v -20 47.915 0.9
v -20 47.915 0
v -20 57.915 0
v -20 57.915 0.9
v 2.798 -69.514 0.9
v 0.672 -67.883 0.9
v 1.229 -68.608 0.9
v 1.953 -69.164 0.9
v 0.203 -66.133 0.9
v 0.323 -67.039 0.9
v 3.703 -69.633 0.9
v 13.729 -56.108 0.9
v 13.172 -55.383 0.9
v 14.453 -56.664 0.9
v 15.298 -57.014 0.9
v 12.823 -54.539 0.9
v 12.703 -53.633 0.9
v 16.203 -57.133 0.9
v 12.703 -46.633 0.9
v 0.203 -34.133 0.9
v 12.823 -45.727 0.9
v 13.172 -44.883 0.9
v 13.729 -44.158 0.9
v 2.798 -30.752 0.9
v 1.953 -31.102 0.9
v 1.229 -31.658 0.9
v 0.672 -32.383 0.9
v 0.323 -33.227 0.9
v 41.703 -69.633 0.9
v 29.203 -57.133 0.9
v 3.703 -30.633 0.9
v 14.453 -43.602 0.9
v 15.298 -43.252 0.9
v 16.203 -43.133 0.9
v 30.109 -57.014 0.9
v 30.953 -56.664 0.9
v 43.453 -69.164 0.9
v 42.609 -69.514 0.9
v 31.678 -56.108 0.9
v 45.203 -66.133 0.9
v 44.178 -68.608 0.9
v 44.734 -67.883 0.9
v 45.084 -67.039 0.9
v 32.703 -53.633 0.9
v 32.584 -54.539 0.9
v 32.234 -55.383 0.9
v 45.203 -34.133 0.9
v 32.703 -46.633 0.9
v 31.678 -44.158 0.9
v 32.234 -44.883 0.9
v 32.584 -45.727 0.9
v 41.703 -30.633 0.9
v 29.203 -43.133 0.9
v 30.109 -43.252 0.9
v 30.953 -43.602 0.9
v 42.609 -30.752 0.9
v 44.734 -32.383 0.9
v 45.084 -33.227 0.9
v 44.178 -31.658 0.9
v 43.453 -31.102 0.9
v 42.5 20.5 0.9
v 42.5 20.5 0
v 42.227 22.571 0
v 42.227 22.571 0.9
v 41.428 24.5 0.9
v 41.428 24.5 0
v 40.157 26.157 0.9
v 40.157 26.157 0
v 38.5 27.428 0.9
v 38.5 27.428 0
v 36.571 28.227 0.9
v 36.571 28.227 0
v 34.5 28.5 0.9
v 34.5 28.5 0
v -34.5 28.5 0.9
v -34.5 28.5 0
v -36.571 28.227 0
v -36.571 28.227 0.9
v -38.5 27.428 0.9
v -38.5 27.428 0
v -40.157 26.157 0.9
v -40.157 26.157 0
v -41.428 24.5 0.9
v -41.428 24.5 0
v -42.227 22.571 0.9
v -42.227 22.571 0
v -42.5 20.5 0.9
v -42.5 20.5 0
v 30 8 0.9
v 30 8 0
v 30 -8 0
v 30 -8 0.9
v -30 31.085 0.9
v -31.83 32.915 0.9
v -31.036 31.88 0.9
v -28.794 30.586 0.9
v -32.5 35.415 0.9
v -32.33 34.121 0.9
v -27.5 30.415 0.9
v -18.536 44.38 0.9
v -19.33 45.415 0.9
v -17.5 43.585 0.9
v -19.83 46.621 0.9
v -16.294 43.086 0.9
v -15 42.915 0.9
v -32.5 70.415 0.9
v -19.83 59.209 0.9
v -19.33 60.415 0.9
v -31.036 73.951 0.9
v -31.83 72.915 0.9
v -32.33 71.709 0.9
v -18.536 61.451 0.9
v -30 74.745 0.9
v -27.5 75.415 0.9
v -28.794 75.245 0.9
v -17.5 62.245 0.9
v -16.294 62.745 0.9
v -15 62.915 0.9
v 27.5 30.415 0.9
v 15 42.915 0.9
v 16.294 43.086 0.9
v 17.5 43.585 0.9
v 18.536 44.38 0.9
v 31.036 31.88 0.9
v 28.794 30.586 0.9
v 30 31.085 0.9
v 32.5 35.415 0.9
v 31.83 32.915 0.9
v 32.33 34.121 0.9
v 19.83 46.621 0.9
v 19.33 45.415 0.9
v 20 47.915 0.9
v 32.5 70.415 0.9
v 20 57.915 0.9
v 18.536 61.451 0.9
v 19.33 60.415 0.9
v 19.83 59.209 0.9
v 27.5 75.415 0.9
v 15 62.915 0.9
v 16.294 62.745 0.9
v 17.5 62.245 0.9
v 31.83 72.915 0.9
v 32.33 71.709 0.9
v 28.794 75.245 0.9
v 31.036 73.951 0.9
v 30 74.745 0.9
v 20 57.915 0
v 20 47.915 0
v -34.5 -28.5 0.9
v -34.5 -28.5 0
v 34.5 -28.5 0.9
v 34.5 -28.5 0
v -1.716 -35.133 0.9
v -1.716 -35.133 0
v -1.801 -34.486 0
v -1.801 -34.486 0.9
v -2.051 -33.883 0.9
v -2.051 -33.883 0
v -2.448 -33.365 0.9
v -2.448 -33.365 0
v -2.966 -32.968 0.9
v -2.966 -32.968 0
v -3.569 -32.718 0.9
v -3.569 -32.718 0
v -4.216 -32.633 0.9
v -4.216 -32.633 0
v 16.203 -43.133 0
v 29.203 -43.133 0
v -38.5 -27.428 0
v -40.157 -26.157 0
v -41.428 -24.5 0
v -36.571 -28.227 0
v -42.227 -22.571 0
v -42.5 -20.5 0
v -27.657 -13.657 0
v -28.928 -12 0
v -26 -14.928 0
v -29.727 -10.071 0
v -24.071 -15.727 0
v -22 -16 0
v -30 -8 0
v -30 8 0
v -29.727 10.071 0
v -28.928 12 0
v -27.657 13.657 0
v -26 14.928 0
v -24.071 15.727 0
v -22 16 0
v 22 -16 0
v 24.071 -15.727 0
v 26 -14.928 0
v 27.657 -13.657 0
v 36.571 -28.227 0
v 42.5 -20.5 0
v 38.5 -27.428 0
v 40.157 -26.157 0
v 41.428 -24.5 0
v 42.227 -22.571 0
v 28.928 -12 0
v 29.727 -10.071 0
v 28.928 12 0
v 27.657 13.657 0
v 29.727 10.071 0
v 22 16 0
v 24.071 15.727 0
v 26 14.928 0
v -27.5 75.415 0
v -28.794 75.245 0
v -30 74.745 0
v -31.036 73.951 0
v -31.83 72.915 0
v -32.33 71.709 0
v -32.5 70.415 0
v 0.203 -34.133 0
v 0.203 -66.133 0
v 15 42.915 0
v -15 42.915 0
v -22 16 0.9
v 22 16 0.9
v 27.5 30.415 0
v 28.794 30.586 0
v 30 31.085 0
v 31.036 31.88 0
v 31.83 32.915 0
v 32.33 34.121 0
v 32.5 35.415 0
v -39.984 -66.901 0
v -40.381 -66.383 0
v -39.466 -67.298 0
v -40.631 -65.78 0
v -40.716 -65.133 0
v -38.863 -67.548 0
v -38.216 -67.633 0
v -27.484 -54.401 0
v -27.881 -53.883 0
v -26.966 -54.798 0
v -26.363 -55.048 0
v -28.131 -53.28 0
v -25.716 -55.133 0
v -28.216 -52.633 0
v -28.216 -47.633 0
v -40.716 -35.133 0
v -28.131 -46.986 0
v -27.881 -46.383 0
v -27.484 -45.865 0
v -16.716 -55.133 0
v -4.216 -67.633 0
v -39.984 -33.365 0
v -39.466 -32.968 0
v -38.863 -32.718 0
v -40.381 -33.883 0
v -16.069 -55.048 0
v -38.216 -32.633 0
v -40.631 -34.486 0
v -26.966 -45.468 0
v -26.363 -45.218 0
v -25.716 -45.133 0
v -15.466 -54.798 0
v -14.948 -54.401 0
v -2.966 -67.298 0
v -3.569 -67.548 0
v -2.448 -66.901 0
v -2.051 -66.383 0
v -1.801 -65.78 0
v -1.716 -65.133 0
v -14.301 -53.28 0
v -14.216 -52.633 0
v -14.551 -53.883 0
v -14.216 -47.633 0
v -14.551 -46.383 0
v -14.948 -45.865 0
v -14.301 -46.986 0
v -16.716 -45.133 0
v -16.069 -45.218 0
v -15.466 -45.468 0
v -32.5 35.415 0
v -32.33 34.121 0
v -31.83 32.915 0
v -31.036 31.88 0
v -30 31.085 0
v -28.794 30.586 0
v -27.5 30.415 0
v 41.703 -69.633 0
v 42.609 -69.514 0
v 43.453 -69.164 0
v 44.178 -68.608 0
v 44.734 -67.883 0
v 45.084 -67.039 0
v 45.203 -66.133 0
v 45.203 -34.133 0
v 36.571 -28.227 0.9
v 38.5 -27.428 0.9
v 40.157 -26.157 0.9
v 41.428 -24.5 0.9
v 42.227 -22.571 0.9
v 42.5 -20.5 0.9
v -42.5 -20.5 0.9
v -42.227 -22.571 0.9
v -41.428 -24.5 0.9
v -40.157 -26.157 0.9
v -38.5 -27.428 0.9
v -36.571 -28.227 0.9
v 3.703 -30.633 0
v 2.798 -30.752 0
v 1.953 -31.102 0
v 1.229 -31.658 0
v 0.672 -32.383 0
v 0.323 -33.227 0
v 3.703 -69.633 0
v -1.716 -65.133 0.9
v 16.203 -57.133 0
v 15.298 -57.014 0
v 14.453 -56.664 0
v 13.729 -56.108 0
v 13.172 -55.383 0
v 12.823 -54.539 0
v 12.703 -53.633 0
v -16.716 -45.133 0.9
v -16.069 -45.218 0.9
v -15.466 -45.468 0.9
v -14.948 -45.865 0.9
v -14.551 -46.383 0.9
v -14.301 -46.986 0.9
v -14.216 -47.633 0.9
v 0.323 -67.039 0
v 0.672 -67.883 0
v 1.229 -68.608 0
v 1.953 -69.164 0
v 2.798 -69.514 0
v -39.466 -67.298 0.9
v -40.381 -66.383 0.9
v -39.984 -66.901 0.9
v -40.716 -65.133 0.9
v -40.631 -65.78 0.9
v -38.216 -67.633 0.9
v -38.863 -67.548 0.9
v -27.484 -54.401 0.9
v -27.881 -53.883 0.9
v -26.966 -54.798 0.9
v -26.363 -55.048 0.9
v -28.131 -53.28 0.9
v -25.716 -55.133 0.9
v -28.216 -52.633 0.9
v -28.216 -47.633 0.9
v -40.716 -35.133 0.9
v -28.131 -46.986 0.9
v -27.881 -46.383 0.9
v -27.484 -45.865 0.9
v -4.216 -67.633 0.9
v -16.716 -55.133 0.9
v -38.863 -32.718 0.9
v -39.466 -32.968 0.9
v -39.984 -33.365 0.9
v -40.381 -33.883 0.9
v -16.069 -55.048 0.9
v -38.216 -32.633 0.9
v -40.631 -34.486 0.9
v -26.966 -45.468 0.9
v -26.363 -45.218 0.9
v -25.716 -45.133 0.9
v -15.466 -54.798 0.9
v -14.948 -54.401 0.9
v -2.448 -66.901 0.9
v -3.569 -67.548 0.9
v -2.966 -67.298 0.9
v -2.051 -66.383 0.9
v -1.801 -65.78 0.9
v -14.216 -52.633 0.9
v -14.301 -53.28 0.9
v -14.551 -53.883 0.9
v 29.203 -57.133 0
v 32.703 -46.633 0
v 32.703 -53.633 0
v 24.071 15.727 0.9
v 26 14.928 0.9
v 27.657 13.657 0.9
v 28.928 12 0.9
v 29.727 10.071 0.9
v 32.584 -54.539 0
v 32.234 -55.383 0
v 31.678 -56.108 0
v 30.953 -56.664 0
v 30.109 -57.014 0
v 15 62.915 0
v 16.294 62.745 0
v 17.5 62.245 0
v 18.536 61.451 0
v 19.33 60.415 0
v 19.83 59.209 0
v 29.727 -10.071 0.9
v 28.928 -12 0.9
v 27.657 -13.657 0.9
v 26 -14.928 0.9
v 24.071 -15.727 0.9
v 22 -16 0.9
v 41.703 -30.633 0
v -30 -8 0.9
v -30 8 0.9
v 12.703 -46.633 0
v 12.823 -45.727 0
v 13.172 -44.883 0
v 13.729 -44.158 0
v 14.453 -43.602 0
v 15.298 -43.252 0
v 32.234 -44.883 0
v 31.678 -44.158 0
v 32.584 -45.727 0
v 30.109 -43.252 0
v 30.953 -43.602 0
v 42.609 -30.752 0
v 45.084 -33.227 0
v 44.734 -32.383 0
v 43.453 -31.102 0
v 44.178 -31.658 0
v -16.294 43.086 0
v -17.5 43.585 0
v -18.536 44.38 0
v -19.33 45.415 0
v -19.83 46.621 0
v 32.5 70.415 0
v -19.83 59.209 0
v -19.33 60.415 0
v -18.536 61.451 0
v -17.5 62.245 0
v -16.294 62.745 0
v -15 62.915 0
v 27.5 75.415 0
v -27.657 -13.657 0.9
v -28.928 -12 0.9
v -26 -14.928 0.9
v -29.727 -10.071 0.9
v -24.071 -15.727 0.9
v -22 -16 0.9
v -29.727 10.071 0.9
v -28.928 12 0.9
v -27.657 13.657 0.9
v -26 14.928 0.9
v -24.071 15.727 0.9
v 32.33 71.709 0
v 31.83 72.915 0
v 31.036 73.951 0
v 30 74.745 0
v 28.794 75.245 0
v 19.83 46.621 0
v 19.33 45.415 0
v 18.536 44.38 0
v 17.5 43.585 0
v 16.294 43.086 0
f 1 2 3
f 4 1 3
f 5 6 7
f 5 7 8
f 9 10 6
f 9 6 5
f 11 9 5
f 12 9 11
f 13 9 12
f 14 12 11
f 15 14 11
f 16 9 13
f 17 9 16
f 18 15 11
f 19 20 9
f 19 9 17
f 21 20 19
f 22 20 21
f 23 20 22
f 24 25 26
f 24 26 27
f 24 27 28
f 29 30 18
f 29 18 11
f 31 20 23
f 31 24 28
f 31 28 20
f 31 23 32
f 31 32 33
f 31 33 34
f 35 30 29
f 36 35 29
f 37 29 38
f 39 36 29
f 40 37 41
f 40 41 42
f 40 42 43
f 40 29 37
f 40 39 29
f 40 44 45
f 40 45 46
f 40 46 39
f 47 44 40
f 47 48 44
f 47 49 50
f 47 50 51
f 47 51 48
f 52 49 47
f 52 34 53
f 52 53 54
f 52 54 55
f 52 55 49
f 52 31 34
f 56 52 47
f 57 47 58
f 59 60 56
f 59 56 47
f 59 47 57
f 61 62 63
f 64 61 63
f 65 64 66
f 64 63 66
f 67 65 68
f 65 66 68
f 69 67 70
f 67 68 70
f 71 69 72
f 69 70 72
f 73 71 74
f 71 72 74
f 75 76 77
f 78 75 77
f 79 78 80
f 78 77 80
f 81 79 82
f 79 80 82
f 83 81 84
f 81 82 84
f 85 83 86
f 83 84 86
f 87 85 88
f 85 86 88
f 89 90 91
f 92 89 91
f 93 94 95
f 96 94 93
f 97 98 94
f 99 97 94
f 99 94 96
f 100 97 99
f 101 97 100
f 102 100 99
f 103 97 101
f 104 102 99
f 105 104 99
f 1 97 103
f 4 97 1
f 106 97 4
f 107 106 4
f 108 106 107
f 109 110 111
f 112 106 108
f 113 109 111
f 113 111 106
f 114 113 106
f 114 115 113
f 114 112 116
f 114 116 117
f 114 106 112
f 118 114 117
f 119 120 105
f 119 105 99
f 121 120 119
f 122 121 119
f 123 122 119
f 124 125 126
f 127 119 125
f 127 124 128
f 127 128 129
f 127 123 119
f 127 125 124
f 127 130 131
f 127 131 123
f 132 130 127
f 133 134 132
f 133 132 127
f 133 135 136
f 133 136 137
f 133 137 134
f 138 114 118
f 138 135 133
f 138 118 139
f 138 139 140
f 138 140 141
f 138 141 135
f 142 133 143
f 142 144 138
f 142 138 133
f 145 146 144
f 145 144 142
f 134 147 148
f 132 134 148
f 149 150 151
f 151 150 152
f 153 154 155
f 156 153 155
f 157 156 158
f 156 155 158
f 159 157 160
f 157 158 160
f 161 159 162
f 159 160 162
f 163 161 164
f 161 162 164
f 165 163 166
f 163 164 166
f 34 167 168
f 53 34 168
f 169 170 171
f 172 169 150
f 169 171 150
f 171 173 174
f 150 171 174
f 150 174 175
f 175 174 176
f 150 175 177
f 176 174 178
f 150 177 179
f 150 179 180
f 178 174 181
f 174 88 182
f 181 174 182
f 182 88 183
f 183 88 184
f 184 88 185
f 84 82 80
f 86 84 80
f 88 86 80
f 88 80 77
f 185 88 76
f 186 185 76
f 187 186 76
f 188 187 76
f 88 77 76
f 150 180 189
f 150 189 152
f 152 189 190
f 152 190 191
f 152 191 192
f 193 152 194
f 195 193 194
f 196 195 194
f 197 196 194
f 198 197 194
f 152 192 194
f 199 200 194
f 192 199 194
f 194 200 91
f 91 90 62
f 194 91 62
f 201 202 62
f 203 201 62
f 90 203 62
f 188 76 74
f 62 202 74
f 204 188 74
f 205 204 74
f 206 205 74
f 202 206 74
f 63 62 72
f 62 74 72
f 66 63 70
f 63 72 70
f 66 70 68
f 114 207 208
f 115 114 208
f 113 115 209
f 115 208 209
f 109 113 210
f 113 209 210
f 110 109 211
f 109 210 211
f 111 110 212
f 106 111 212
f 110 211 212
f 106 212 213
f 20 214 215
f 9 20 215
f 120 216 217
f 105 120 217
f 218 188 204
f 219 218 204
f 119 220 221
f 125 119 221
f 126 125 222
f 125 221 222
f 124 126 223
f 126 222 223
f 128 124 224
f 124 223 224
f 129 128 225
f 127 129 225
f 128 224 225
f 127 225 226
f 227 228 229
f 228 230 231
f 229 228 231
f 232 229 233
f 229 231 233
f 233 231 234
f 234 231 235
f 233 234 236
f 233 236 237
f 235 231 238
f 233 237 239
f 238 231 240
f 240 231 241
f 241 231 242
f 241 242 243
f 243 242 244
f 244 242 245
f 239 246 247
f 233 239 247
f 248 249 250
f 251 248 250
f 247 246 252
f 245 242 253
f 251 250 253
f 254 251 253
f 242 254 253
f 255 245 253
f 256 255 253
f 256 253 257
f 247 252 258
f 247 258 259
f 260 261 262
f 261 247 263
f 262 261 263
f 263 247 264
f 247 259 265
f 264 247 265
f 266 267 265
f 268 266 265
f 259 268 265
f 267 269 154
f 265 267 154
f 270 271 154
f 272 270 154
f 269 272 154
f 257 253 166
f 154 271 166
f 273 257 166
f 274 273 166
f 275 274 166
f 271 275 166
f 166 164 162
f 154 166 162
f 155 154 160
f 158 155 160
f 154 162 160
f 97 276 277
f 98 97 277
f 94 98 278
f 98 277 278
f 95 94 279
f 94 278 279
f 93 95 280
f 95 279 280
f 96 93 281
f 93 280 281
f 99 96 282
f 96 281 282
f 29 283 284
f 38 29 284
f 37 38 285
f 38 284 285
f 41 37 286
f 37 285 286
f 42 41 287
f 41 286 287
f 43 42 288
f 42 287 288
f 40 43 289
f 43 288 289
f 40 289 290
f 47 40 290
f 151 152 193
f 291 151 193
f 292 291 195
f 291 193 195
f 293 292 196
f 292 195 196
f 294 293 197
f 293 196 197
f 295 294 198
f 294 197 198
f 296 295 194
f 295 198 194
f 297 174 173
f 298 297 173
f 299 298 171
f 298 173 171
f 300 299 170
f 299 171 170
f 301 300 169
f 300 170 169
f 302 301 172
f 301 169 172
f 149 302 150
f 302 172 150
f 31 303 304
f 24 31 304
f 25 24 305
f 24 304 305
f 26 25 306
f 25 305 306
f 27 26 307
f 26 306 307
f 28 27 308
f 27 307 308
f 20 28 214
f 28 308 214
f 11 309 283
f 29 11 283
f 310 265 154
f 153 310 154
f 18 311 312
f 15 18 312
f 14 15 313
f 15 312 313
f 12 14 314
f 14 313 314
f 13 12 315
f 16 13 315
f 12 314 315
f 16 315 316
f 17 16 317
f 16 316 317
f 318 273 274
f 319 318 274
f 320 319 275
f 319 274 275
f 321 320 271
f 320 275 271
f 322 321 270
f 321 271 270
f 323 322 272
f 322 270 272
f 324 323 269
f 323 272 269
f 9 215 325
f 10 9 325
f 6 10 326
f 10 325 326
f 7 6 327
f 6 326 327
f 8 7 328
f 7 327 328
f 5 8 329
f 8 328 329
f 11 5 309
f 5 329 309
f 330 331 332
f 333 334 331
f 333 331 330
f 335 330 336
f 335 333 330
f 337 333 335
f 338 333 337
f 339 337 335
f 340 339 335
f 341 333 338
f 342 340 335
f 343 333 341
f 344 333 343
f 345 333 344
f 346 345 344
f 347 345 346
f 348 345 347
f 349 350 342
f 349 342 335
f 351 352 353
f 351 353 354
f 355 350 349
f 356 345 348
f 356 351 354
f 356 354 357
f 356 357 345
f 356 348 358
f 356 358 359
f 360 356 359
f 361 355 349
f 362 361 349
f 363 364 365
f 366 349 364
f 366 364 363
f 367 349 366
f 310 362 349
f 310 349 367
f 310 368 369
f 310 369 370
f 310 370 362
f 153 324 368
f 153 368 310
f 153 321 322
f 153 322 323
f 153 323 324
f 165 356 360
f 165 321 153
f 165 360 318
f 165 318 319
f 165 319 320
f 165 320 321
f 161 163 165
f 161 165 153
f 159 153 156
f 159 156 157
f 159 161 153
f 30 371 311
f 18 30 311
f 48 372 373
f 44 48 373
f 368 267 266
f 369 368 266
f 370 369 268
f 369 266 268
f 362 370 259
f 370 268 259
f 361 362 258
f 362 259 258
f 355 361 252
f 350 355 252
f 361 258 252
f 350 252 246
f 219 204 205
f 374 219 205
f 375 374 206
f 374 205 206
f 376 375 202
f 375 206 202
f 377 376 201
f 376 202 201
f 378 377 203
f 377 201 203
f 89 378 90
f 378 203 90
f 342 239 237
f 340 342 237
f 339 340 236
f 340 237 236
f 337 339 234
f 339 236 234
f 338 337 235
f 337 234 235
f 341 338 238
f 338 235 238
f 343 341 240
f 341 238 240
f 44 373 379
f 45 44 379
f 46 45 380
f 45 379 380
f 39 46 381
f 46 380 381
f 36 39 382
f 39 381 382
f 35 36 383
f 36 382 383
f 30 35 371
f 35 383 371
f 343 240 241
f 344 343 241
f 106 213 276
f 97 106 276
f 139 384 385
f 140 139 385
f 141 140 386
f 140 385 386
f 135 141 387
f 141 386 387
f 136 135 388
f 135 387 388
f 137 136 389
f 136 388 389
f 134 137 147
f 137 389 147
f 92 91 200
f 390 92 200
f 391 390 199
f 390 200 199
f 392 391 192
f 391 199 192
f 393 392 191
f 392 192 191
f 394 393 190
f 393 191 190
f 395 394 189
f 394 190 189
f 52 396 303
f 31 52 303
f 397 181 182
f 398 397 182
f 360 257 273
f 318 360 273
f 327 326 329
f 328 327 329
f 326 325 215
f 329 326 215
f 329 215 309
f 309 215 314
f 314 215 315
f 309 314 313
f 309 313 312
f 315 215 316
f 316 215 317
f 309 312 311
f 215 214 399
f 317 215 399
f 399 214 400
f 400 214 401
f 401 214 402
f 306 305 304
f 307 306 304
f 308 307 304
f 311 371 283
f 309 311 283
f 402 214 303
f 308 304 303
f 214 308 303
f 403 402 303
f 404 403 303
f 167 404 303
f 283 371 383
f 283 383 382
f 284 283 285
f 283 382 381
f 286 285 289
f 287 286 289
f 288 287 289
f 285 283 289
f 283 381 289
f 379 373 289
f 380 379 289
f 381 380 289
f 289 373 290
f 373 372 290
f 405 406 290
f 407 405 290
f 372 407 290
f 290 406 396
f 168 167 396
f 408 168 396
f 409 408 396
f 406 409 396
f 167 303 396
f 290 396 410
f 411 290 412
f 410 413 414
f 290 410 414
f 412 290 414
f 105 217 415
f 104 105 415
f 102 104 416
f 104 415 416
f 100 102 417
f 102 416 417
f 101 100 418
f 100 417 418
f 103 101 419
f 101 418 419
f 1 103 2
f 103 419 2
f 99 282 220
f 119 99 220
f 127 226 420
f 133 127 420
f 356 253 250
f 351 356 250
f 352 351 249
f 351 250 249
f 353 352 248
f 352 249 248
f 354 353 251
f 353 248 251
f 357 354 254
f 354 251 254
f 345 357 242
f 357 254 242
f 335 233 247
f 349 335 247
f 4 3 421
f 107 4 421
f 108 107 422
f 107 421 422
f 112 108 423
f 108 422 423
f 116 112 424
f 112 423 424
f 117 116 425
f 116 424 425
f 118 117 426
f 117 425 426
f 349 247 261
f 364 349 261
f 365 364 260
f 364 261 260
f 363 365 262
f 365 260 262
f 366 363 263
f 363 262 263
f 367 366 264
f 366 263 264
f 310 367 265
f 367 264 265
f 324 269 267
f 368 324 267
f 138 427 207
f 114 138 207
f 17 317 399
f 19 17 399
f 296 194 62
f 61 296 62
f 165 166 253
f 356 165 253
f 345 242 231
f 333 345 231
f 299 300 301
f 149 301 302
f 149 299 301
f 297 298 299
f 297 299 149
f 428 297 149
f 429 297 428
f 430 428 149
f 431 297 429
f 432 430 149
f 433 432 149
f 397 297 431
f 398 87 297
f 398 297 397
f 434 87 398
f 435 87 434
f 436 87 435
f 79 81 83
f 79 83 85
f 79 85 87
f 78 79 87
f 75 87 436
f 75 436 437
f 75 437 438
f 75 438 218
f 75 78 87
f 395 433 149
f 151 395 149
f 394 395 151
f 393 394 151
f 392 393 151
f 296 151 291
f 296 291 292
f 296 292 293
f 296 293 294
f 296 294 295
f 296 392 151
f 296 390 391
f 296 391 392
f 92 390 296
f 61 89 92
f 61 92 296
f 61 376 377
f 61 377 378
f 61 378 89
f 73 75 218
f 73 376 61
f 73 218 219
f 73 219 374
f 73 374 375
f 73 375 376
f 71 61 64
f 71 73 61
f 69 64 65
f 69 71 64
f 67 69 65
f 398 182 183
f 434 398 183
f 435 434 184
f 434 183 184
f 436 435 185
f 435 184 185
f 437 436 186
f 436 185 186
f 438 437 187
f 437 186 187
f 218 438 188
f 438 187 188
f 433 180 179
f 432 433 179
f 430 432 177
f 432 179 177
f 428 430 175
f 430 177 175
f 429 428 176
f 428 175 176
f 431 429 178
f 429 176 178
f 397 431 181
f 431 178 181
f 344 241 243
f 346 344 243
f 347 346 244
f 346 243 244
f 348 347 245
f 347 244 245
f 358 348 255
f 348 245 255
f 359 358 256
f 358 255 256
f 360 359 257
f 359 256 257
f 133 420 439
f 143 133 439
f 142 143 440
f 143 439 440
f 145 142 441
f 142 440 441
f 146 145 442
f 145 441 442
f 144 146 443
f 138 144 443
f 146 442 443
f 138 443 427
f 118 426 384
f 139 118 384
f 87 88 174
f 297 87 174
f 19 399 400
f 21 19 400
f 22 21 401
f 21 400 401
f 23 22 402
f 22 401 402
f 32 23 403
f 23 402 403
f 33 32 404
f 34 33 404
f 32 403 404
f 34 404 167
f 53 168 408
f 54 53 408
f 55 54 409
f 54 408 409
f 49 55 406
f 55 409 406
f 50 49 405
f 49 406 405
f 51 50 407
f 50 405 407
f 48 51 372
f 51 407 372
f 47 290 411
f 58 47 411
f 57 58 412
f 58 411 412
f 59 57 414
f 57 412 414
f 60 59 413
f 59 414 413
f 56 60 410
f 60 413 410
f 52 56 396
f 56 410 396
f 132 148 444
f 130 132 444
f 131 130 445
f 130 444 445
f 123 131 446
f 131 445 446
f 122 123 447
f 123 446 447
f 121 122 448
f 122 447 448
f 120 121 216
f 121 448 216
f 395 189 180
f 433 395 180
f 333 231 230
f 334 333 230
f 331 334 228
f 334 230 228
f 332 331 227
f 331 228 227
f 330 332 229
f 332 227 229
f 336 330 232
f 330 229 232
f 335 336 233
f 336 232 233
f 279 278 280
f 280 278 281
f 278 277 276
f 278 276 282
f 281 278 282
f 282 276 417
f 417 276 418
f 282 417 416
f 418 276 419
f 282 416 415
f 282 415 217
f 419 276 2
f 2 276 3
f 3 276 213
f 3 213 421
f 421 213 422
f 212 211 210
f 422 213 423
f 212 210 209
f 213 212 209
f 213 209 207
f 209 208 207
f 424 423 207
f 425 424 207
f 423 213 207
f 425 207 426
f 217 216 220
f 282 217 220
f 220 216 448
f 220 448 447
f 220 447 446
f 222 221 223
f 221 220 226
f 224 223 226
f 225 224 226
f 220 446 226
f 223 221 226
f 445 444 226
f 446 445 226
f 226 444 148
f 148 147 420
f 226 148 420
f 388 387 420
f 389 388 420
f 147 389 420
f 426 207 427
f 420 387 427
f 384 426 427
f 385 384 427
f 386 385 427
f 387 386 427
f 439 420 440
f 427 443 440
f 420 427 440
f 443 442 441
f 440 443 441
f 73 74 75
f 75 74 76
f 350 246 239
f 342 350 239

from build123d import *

# Parameters (mm, degrees)
F1_DEPTH = 0.9


with BuildPart() as f1:
    # F0 (on Top) → F1 (new body)
    with BuildSketch(Plane.XY):
        with BuildLine():
            Line((-38.215932, -67.632949), (-4.215932, -67.632949))
            ThreePointArc((-4.215932, -67.632949), (-2.448165, -66.900716), (-1.715932, -65.132949))
            Line((-1.715932, -65.132949), (-1.715932, -35.132949))
            ThreePointArc((-1.715932, -35.132949), (-2.448165, -33.365182), (-4.215932, -32.632949))
            Line((-4.215932, -32.632949), (-38.215932, -32.632949))
            ThreePointArc((-38.215932, -32.632949), (-39.983699, -33.365182), (-40.715932, -35.132949))
            Line((-40.715932, -35.132949), (-40.715932, -65.132949))
            ThreePointArc((-40.715932, -65.132949), (-39.983699, -66.900716), (-38.215932, -67.632949))
        make_face()
        with BuildLine():
            ThreePointArc((-14.215932, -52.632949), (-14.948165, -54.400716), (-16.715932, -55.132949))
            Line((-16.715932, -55.132949), (-25.715932, -55.132949))
            ThreePointArc((-25.715932, -55.132949), (-27.483699, -54.400716), (-28.215932, -52.632949))
            Line((-28.215932, -52.632949), (-28.215932, -47.632949))
            ThreePointArc((-28.215932, -47.632949), (-27.483699, -45.865182), (-25.715932, -45.132949))
            Line((-25.715932, -45.132949), (-16.715932, -45.132949))
            ThreePointArc((-16.715932, -45.132949), (-14.948165, -45.865182), (-14.215932, -47.632949))
            Line((-14.215932, -47.632949), (-14.215932, -52.632949))
        make_face(mode=Mode.SUBTRACT)
        with BuildLine():
            Line((3.703378, -69.632949), (41.703378, -69.632949))
            ThreePointArc((41.703378, -69.632949), (44.178252, -68.607823), (45.203378, -66.132949))
            Line((45.203378, -66.132949), (45.203378, -34.132949))
            ThreePointArc((45.203378, -34.132949), (44.178252, -31.658075), (41.703378, -30.632949))
            Line((41.703378, -30.632949), (3.703378, -30.632949))
            ThreePointArc((3.703378, -30.632949), (1.228505, -31.658075), (0.203378, -34.132949))
            Line((0.203378, -34.132949), (0.203378, -66.132949))
            ThreePointArc((0.203378, -66.132949), (1.228505, -68.607823), (3.703378, -69.632949))
        make_face()
        with BuildLine():
            ThreePointArc((32.703378, -53.632949), (31.678252, -56.107823), (29.203378, -57.132949))
            Line((29.203378, -57.132949), (16.203378, -57.132949))
            ThreePointArc((16.203378, -57.132949), (13.728505, -56.107823), (12.703378, -53.632949))
            Line((12.703378, -53.632949), (12.703378, -46.632949))
            ThreePointArc((12.703378, -46.632949), (13.728505, -44.158075), (16.203378, -43.132949))
            Line((16.203378, -43.132949), (29.203378, -43.132949))
            ThreePointArc((29.203378, -43.132949), (31.678252, -44.158075), (32.703378, -46.632949))
            Line((32.703378, -46.632949), (32.703378, -53.632949))
        make_face(mode=Mode.SUBTRACT)
        with BuildLine():
            Line((-34.5, -28.5), (34.5, -28.5))
            ThreePointArc((34.5, -28.5), (40.156854, -26.156854), (42.5, -20.5))
            Line((42.5, -20.5), (42.5, 20.5))
            ThreePointArc((42.5, 20.5), (40.156854, 26.156854), (34.5, 28.5))
            Line((34.5, 28.5), (-34.5, 28.5))
            ThreePointArc((-34.5, 28.5), (-40.156854, 26.156854), (-42.5, 20.5))
            Line((-42.5, 20.5), (-42.5, -20.5))
            ThreePointArc((-42.5, -20.5), (-40.156854, -26.156854), (-34.5, -28.5))
        make_face()
        with BuildLine():
            ThreePointArc((30, -8), (27.656854, -13.656854), (22, -16))
            Line((22, -16), (-22, -16))
            ThreePointArc((-22, -16), (-27.656854, -13.656854), (-30, -8))
            Line((-30, -8), (-30, 8))
            ThreePointArc((-30, 8), (-27.656854, 13.656854), (-22, 16))
            Line((-22, 16), (22, 16))
            ThreePointArc((22, 16), (27.656854, 13.656854), (30, 8))
            Line((30, 8), (30, -8))
        make_face(mode=Mode.SUBTRACT)
        with BuildLine():
            Line((-27.5, 30.415271), (27.5, 30.415271))
            ThreePointArc((27.5, 30.415271), (31.035534, 31.879737), (32.5, 35.415271))
            Line((32.5, 35.415271), (32.5, 70.415271))
            ThreePointArc((32.5, 70.415271), (31.035534, 73.950805), (27.5, 75.415271))
            Line((27.5, 75.415271), (-27.5, 75.415271))
            ThreePointArc((-27.5, 75.415271), (-31.035534, 73.950805), (-32.5, 70.415271))
            Line((-32.5, 70.415271), (-32.5, 35.415271))
            ThreePointArc((-32.5, 35.415271), (-31.035534, 31.879737), (-27.5, 30.415271))
        make_face()
        with BuildLine():
            ThreePointArc((20, 47.915271), (18.535534, 44.379737), (15, 42.915271))
            Line((15, 42.915271), (-15, 42.915271))
            ThreePointArc((-15, 42.915271), (-18.535534, 44.379737), (-20, 47.915271))
            Line((-20, 47.915271), (-20, 57.915271))
            ThreePointArc((-20, 57.915271), (-18.535534, 61.450805), (-15, 62.915271))
            Line((-15, 62.915271), (15, 62.915271))
            ThreePointArc((15, 62.915271), (18.535534, 61.450805), (20, 57.915271))
            Line((20, 57.915271), (20, 47.915271))
        make_face(mode=Mode.SUBTRACT)
    extrude(amount=F1_DEPTH)


solid = f1.part
